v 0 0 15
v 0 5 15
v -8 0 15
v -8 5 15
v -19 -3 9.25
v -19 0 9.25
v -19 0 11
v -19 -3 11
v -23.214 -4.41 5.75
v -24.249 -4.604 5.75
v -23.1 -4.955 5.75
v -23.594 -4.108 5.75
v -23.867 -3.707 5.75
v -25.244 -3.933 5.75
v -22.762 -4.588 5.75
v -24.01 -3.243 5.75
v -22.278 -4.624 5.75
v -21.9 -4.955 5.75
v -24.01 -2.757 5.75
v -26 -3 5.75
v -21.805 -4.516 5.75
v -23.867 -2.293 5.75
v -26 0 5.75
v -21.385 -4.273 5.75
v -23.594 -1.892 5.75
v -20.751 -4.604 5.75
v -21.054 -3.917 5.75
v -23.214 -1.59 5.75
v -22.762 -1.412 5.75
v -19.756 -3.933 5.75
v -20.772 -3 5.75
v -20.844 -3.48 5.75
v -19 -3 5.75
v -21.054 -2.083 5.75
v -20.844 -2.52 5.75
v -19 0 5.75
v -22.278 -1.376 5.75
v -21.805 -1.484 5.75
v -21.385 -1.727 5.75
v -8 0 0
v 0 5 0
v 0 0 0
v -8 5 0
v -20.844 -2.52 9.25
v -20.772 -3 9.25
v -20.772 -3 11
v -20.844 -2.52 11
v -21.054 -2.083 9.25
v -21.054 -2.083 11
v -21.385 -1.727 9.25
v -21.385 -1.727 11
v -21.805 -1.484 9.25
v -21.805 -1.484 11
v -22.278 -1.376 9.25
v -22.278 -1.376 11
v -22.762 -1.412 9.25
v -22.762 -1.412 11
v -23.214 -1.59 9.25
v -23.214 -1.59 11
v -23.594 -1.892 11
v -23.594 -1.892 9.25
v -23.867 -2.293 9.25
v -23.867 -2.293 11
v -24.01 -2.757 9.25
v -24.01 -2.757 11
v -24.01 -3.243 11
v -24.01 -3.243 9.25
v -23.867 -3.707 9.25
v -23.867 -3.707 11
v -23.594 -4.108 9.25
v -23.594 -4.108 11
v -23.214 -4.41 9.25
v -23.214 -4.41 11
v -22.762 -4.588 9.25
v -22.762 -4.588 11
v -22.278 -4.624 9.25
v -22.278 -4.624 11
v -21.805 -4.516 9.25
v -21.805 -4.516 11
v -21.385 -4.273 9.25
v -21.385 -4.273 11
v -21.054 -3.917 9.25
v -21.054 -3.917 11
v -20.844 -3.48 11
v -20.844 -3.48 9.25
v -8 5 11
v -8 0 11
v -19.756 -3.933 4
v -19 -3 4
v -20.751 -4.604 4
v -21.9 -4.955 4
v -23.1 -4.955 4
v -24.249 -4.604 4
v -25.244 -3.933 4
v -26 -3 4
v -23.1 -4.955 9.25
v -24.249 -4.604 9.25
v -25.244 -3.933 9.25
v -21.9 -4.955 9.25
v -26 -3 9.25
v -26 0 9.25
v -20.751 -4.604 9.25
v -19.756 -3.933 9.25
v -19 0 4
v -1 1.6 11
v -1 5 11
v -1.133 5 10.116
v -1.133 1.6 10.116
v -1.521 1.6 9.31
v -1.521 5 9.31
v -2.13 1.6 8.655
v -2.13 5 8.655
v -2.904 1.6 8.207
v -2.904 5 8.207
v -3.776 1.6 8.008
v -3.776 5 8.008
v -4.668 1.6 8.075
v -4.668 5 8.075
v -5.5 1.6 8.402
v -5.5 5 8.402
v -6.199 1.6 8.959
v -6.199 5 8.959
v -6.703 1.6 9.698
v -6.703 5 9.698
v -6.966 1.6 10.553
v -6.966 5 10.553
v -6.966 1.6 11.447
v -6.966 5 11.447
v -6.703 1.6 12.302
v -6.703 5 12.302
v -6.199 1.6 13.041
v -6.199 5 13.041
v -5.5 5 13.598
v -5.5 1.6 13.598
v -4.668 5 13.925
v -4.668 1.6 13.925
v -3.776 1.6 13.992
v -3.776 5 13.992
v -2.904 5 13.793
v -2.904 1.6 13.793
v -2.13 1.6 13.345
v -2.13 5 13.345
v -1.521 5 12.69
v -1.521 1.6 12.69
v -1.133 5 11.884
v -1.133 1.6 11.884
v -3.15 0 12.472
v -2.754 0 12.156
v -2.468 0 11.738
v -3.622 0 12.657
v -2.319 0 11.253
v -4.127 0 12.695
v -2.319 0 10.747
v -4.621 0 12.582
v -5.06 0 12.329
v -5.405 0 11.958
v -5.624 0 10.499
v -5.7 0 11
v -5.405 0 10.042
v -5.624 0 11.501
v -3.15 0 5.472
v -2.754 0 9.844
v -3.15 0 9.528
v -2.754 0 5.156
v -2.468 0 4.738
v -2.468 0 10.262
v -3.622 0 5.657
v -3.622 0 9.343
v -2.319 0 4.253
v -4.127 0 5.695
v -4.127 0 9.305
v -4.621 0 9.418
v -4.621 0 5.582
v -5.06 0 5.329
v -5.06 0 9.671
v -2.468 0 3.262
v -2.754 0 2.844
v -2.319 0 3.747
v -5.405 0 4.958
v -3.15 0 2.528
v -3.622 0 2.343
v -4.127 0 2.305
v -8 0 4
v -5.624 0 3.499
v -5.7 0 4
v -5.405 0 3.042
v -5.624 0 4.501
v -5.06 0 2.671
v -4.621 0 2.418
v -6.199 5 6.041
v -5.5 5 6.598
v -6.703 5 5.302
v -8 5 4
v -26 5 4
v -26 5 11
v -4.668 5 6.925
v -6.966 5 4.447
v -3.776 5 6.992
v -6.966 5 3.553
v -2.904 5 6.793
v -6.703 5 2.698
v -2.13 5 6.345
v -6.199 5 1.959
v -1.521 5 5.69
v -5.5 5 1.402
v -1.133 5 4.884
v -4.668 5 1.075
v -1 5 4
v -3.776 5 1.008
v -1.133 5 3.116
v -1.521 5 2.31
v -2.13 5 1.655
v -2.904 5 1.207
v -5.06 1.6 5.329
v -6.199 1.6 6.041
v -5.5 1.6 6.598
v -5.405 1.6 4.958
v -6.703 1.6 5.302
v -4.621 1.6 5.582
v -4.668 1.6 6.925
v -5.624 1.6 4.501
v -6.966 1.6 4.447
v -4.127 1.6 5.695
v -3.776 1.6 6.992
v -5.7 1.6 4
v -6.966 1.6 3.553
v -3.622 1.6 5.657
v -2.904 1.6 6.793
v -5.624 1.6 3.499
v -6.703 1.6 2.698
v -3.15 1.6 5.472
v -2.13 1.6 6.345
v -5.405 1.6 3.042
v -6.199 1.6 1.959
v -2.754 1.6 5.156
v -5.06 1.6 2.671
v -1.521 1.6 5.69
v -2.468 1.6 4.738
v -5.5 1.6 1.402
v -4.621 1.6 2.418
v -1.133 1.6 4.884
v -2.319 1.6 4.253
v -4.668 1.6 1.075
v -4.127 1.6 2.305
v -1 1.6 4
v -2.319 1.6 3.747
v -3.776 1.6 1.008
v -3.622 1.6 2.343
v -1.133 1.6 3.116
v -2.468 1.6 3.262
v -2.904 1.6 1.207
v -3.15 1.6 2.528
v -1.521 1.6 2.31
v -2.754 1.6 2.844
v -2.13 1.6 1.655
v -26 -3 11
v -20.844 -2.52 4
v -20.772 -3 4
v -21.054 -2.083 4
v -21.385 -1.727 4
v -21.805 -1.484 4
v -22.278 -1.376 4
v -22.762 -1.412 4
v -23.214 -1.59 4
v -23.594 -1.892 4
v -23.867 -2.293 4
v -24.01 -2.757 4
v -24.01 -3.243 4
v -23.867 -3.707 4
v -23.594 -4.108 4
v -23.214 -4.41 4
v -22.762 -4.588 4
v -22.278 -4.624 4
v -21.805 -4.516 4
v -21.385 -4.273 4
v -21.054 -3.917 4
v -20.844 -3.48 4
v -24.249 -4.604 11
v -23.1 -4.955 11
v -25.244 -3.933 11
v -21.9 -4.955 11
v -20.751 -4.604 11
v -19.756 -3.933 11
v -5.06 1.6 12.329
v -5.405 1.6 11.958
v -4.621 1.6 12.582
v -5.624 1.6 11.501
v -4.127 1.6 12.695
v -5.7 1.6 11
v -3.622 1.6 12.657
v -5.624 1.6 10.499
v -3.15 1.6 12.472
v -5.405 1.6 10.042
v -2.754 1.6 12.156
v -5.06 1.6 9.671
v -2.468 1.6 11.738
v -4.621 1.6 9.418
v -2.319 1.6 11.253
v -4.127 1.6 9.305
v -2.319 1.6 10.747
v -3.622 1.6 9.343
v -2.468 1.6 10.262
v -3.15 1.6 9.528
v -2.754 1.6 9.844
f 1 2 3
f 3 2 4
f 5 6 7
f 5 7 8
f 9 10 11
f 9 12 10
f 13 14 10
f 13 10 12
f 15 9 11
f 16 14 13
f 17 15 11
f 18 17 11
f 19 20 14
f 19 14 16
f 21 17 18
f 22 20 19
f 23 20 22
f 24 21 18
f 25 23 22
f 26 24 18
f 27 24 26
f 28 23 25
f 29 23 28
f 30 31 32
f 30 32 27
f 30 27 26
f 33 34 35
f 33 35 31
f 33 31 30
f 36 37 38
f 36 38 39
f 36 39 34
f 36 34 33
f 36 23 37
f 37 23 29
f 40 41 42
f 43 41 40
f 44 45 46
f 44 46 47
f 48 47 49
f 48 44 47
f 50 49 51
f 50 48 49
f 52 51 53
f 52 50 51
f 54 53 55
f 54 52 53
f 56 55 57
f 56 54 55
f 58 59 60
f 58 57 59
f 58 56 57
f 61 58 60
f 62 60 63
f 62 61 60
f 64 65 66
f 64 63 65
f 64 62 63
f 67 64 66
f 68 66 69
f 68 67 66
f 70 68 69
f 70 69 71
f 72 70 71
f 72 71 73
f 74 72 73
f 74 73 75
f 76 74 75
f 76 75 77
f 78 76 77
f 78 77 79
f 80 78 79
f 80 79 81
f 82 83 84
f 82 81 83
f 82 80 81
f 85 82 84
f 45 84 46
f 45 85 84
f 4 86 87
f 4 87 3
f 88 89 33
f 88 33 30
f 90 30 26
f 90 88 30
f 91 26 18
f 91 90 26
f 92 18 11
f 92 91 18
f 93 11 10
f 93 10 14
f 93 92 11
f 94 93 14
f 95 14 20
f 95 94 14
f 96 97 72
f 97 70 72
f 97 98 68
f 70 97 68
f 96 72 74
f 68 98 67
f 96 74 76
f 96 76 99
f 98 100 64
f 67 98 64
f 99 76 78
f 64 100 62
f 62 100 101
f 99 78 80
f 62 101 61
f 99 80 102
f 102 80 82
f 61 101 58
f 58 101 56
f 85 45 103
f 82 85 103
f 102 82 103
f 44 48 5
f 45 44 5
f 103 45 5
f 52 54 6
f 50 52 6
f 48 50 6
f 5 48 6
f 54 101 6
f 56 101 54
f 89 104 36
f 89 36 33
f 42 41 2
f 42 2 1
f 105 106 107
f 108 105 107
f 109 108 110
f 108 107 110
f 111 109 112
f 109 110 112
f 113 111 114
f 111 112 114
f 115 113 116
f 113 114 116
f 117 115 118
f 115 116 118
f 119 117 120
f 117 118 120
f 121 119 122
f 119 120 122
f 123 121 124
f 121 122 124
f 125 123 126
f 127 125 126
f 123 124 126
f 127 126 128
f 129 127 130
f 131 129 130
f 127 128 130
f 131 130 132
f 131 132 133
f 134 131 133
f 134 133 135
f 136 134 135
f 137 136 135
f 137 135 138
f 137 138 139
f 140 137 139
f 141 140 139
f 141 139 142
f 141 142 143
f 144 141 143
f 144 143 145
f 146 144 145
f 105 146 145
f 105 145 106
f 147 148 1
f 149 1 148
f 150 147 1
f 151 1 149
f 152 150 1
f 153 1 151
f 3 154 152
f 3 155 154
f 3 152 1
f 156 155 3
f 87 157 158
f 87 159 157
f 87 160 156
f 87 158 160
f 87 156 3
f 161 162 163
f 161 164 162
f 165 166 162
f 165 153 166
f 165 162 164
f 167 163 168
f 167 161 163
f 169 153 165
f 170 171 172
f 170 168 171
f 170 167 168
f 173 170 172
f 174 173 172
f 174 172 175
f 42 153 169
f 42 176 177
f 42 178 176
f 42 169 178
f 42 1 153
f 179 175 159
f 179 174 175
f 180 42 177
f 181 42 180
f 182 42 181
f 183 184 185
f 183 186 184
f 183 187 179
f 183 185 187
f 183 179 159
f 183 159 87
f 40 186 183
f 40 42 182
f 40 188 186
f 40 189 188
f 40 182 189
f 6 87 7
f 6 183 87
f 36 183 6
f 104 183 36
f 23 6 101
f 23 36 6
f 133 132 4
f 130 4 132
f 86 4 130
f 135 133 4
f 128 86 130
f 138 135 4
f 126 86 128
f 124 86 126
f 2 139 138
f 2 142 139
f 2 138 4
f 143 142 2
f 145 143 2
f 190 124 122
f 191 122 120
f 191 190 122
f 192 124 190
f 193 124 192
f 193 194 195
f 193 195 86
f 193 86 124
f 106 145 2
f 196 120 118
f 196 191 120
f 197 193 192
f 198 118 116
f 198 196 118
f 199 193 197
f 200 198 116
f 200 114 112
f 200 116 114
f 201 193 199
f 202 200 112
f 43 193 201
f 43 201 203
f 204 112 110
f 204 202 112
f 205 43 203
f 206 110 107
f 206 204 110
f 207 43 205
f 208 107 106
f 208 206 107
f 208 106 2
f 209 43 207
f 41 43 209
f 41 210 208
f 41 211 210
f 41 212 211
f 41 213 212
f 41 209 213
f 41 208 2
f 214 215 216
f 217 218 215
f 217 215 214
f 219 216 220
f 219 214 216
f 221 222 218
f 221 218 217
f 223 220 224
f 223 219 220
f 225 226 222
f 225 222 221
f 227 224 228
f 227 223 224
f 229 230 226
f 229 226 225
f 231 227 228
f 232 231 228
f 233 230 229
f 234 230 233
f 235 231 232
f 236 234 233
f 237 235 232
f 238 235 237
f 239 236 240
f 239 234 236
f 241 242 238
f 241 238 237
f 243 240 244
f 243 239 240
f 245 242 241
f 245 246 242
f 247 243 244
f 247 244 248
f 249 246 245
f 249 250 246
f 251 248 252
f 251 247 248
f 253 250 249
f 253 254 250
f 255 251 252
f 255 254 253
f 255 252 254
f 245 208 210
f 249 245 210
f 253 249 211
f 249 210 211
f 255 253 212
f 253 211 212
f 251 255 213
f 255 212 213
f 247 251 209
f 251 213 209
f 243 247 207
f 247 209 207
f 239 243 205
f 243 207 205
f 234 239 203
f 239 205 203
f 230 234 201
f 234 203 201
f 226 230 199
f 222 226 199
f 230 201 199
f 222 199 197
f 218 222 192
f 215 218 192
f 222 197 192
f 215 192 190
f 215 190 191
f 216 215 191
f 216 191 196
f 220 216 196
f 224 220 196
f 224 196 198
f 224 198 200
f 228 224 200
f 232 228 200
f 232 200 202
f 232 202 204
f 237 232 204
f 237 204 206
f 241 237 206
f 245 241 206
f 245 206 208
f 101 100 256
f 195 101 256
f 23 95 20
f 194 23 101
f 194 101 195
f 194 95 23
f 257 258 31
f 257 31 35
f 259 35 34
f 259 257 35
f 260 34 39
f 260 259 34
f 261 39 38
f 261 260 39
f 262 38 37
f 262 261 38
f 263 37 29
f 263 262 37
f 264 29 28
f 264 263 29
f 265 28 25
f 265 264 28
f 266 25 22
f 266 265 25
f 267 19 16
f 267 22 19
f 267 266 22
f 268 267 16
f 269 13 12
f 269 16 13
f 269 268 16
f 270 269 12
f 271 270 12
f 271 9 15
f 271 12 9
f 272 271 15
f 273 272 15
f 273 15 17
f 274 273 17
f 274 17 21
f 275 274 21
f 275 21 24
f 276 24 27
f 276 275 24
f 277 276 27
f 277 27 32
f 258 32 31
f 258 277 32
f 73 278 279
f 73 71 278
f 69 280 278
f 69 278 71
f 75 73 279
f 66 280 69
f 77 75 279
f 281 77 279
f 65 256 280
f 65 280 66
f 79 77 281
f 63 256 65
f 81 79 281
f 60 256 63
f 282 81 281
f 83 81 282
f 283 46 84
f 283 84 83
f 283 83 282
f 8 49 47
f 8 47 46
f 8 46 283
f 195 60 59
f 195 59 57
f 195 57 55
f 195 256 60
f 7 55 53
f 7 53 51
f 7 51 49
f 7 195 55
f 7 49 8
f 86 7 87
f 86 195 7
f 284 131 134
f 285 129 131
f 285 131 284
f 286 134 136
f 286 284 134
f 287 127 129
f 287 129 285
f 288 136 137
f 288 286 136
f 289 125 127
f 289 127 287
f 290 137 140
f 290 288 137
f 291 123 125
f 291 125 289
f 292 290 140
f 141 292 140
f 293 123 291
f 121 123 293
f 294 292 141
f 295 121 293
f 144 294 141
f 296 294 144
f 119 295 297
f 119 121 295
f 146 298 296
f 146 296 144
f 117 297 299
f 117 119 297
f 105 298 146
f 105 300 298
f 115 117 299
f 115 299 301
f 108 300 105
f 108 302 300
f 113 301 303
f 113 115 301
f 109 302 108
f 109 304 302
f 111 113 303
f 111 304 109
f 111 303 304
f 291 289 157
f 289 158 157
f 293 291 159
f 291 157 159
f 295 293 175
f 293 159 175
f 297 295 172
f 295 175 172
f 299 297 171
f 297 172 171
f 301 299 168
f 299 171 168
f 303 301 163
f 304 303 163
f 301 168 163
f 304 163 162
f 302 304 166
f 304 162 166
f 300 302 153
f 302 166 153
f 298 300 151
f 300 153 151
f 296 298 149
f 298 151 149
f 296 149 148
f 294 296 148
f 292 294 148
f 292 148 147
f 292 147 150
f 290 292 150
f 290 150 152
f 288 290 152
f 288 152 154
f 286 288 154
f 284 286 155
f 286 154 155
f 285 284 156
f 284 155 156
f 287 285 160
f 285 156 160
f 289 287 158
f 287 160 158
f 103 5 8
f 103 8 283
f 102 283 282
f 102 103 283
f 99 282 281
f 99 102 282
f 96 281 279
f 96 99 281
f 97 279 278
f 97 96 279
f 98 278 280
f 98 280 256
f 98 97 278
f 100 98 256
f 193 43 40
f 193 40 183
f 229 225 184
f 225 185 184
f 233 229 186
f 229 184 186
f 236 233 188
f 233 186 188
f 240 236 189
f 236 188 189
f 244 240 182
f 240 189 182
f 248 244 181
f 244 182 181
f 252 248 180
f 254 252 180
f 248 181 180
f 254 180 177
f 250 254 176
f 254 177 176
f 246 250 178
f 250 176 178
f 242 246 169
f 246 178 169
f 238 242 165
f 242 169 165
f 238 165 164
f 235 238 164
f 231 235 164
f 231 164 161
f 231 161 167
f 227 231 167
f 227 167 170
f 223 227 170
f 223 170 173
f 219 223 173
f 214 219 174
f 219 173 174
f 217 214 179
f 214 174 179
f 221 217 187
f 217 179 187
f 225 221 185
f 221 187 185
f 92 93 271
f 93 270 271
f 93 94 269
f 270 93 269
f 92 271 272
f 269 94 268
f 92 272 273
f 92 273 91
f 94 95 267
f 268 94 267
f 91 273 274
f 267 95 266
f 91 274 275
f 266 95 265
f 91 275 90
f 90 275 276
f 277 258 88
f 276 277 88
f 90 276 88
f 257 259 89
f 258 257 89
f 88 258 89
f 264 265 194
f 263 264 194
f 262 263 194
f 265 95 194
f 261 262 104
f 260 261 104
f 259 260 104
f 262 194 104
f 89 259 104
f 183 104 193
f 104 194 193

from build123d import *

# Parameters (mm, degrees)
SKETCH_1_R                = 1.628497573
EXTRUDE_1_DEPTH           = 15
SKETCH_2_W                = 7
SKETCH_2_H                = 3.5
CUT_EXTRUDE_1_DEPTH       = 5
CUT_EXTRUDE_4_DEPTH       = 31.430248109
CUT_EXTRUDE_4_DEPTH_BACK  = 31.430248109
SKETCH_5_W                = 18
SKETCH_5_H                = 4
HOLE_WIZARD_1_D           = 3.4
HOLE_WIZARD_1_DEPTH       = 18.5
HOLE_WIZARD_1_CBORE_D     = 6
HOLE_WIZARD_1_CBORE_DEPTH = 3.4
HOLE_WIZARD_1_TIP         = 1.021463052


with BuildPart() as part:
    # 草图1 → 凸台-拉伸1 (new body)
    with BuildSketch(Plane.XY):
        with BuildLine():
            Line((0, 0), (-19, 0))
            Line((-19, 0), (-19, -3))
            ThreePointArc((-19, -3), (-22.5, -5), (-26, -3))
            Line((-26, -3), (-26, 0))
            Line((-26, 0), (-26, 5))
            Line((-26, 5), (0, 5))
            Line((0, 5), (0, 0))
        make_face()
        with Locations((-22.4, -3)):
            Circle(SKETCH_1_R, mode=Mode.SUBTRACT)
    extrude(amount=EXTRUDE_1_DEPTH)

    # 草图2 → 切除-拉伸1 (cut)
    with BuildSketch(Plane.XZ):
        with Locations((-22.5, 7.5)):
            Rectangle(SKETCH_2_W, SKETCH_2_H)
    extrude(amount=CUT_EXTRUDE_1_DEPTH, mode=Mode.SUBTRACT)

    # 草图5 → 切除-拉伸4 (cut, two sides: drawn at the far end of the back side and taken through both)
    with BuildSketch(Plane.XZ.offset(-CUT_EXTRUDE_4_DEPTH_BACK)):
        with Locations((-17, 13)):
            Rectangle(SKETCH_5_W, SKETCH_5_H)
        with Locations((-17, 2)):
            Rectangle(SKETCH_5_W, SKETCH_5_H)
    extrude(amount=CUT_EXTRUDE_4_DEPTH + CUT_EXTRUDE_4_DEPTH_BACK, mode=Mode.SUBTRACT)

    # 打孔尺寸(%根据)内六角圆柱头螺钉的类型1
    with Locations(Plane(origin=(-4, 5, 4), x_dir=(1, 0, 0), z_dir=(0, 1, 0))):
        with Locations((0, 0), (0, -7)):
            CounterBoreHole(HOLE_WIZARD_1_D / 2, HOLE_WIZARD_1_CBORE_D / 2, HOLE_WIZARD_1_CBORE_DEPTH, depth=HOLE_WIZARD_1_DEPTH)
            with Locations((0, 0, -(HOLE_WIZARD_1_DEPTH + HOLE_WIZARD_1_TIP / 2))):  # 118° drill point
                Cone(0, HOLE_WIZARD_1_D / 2, HOLE_WIZARD_1_TIP, mode=Mode.SUBTRACT)


solid = part.part
